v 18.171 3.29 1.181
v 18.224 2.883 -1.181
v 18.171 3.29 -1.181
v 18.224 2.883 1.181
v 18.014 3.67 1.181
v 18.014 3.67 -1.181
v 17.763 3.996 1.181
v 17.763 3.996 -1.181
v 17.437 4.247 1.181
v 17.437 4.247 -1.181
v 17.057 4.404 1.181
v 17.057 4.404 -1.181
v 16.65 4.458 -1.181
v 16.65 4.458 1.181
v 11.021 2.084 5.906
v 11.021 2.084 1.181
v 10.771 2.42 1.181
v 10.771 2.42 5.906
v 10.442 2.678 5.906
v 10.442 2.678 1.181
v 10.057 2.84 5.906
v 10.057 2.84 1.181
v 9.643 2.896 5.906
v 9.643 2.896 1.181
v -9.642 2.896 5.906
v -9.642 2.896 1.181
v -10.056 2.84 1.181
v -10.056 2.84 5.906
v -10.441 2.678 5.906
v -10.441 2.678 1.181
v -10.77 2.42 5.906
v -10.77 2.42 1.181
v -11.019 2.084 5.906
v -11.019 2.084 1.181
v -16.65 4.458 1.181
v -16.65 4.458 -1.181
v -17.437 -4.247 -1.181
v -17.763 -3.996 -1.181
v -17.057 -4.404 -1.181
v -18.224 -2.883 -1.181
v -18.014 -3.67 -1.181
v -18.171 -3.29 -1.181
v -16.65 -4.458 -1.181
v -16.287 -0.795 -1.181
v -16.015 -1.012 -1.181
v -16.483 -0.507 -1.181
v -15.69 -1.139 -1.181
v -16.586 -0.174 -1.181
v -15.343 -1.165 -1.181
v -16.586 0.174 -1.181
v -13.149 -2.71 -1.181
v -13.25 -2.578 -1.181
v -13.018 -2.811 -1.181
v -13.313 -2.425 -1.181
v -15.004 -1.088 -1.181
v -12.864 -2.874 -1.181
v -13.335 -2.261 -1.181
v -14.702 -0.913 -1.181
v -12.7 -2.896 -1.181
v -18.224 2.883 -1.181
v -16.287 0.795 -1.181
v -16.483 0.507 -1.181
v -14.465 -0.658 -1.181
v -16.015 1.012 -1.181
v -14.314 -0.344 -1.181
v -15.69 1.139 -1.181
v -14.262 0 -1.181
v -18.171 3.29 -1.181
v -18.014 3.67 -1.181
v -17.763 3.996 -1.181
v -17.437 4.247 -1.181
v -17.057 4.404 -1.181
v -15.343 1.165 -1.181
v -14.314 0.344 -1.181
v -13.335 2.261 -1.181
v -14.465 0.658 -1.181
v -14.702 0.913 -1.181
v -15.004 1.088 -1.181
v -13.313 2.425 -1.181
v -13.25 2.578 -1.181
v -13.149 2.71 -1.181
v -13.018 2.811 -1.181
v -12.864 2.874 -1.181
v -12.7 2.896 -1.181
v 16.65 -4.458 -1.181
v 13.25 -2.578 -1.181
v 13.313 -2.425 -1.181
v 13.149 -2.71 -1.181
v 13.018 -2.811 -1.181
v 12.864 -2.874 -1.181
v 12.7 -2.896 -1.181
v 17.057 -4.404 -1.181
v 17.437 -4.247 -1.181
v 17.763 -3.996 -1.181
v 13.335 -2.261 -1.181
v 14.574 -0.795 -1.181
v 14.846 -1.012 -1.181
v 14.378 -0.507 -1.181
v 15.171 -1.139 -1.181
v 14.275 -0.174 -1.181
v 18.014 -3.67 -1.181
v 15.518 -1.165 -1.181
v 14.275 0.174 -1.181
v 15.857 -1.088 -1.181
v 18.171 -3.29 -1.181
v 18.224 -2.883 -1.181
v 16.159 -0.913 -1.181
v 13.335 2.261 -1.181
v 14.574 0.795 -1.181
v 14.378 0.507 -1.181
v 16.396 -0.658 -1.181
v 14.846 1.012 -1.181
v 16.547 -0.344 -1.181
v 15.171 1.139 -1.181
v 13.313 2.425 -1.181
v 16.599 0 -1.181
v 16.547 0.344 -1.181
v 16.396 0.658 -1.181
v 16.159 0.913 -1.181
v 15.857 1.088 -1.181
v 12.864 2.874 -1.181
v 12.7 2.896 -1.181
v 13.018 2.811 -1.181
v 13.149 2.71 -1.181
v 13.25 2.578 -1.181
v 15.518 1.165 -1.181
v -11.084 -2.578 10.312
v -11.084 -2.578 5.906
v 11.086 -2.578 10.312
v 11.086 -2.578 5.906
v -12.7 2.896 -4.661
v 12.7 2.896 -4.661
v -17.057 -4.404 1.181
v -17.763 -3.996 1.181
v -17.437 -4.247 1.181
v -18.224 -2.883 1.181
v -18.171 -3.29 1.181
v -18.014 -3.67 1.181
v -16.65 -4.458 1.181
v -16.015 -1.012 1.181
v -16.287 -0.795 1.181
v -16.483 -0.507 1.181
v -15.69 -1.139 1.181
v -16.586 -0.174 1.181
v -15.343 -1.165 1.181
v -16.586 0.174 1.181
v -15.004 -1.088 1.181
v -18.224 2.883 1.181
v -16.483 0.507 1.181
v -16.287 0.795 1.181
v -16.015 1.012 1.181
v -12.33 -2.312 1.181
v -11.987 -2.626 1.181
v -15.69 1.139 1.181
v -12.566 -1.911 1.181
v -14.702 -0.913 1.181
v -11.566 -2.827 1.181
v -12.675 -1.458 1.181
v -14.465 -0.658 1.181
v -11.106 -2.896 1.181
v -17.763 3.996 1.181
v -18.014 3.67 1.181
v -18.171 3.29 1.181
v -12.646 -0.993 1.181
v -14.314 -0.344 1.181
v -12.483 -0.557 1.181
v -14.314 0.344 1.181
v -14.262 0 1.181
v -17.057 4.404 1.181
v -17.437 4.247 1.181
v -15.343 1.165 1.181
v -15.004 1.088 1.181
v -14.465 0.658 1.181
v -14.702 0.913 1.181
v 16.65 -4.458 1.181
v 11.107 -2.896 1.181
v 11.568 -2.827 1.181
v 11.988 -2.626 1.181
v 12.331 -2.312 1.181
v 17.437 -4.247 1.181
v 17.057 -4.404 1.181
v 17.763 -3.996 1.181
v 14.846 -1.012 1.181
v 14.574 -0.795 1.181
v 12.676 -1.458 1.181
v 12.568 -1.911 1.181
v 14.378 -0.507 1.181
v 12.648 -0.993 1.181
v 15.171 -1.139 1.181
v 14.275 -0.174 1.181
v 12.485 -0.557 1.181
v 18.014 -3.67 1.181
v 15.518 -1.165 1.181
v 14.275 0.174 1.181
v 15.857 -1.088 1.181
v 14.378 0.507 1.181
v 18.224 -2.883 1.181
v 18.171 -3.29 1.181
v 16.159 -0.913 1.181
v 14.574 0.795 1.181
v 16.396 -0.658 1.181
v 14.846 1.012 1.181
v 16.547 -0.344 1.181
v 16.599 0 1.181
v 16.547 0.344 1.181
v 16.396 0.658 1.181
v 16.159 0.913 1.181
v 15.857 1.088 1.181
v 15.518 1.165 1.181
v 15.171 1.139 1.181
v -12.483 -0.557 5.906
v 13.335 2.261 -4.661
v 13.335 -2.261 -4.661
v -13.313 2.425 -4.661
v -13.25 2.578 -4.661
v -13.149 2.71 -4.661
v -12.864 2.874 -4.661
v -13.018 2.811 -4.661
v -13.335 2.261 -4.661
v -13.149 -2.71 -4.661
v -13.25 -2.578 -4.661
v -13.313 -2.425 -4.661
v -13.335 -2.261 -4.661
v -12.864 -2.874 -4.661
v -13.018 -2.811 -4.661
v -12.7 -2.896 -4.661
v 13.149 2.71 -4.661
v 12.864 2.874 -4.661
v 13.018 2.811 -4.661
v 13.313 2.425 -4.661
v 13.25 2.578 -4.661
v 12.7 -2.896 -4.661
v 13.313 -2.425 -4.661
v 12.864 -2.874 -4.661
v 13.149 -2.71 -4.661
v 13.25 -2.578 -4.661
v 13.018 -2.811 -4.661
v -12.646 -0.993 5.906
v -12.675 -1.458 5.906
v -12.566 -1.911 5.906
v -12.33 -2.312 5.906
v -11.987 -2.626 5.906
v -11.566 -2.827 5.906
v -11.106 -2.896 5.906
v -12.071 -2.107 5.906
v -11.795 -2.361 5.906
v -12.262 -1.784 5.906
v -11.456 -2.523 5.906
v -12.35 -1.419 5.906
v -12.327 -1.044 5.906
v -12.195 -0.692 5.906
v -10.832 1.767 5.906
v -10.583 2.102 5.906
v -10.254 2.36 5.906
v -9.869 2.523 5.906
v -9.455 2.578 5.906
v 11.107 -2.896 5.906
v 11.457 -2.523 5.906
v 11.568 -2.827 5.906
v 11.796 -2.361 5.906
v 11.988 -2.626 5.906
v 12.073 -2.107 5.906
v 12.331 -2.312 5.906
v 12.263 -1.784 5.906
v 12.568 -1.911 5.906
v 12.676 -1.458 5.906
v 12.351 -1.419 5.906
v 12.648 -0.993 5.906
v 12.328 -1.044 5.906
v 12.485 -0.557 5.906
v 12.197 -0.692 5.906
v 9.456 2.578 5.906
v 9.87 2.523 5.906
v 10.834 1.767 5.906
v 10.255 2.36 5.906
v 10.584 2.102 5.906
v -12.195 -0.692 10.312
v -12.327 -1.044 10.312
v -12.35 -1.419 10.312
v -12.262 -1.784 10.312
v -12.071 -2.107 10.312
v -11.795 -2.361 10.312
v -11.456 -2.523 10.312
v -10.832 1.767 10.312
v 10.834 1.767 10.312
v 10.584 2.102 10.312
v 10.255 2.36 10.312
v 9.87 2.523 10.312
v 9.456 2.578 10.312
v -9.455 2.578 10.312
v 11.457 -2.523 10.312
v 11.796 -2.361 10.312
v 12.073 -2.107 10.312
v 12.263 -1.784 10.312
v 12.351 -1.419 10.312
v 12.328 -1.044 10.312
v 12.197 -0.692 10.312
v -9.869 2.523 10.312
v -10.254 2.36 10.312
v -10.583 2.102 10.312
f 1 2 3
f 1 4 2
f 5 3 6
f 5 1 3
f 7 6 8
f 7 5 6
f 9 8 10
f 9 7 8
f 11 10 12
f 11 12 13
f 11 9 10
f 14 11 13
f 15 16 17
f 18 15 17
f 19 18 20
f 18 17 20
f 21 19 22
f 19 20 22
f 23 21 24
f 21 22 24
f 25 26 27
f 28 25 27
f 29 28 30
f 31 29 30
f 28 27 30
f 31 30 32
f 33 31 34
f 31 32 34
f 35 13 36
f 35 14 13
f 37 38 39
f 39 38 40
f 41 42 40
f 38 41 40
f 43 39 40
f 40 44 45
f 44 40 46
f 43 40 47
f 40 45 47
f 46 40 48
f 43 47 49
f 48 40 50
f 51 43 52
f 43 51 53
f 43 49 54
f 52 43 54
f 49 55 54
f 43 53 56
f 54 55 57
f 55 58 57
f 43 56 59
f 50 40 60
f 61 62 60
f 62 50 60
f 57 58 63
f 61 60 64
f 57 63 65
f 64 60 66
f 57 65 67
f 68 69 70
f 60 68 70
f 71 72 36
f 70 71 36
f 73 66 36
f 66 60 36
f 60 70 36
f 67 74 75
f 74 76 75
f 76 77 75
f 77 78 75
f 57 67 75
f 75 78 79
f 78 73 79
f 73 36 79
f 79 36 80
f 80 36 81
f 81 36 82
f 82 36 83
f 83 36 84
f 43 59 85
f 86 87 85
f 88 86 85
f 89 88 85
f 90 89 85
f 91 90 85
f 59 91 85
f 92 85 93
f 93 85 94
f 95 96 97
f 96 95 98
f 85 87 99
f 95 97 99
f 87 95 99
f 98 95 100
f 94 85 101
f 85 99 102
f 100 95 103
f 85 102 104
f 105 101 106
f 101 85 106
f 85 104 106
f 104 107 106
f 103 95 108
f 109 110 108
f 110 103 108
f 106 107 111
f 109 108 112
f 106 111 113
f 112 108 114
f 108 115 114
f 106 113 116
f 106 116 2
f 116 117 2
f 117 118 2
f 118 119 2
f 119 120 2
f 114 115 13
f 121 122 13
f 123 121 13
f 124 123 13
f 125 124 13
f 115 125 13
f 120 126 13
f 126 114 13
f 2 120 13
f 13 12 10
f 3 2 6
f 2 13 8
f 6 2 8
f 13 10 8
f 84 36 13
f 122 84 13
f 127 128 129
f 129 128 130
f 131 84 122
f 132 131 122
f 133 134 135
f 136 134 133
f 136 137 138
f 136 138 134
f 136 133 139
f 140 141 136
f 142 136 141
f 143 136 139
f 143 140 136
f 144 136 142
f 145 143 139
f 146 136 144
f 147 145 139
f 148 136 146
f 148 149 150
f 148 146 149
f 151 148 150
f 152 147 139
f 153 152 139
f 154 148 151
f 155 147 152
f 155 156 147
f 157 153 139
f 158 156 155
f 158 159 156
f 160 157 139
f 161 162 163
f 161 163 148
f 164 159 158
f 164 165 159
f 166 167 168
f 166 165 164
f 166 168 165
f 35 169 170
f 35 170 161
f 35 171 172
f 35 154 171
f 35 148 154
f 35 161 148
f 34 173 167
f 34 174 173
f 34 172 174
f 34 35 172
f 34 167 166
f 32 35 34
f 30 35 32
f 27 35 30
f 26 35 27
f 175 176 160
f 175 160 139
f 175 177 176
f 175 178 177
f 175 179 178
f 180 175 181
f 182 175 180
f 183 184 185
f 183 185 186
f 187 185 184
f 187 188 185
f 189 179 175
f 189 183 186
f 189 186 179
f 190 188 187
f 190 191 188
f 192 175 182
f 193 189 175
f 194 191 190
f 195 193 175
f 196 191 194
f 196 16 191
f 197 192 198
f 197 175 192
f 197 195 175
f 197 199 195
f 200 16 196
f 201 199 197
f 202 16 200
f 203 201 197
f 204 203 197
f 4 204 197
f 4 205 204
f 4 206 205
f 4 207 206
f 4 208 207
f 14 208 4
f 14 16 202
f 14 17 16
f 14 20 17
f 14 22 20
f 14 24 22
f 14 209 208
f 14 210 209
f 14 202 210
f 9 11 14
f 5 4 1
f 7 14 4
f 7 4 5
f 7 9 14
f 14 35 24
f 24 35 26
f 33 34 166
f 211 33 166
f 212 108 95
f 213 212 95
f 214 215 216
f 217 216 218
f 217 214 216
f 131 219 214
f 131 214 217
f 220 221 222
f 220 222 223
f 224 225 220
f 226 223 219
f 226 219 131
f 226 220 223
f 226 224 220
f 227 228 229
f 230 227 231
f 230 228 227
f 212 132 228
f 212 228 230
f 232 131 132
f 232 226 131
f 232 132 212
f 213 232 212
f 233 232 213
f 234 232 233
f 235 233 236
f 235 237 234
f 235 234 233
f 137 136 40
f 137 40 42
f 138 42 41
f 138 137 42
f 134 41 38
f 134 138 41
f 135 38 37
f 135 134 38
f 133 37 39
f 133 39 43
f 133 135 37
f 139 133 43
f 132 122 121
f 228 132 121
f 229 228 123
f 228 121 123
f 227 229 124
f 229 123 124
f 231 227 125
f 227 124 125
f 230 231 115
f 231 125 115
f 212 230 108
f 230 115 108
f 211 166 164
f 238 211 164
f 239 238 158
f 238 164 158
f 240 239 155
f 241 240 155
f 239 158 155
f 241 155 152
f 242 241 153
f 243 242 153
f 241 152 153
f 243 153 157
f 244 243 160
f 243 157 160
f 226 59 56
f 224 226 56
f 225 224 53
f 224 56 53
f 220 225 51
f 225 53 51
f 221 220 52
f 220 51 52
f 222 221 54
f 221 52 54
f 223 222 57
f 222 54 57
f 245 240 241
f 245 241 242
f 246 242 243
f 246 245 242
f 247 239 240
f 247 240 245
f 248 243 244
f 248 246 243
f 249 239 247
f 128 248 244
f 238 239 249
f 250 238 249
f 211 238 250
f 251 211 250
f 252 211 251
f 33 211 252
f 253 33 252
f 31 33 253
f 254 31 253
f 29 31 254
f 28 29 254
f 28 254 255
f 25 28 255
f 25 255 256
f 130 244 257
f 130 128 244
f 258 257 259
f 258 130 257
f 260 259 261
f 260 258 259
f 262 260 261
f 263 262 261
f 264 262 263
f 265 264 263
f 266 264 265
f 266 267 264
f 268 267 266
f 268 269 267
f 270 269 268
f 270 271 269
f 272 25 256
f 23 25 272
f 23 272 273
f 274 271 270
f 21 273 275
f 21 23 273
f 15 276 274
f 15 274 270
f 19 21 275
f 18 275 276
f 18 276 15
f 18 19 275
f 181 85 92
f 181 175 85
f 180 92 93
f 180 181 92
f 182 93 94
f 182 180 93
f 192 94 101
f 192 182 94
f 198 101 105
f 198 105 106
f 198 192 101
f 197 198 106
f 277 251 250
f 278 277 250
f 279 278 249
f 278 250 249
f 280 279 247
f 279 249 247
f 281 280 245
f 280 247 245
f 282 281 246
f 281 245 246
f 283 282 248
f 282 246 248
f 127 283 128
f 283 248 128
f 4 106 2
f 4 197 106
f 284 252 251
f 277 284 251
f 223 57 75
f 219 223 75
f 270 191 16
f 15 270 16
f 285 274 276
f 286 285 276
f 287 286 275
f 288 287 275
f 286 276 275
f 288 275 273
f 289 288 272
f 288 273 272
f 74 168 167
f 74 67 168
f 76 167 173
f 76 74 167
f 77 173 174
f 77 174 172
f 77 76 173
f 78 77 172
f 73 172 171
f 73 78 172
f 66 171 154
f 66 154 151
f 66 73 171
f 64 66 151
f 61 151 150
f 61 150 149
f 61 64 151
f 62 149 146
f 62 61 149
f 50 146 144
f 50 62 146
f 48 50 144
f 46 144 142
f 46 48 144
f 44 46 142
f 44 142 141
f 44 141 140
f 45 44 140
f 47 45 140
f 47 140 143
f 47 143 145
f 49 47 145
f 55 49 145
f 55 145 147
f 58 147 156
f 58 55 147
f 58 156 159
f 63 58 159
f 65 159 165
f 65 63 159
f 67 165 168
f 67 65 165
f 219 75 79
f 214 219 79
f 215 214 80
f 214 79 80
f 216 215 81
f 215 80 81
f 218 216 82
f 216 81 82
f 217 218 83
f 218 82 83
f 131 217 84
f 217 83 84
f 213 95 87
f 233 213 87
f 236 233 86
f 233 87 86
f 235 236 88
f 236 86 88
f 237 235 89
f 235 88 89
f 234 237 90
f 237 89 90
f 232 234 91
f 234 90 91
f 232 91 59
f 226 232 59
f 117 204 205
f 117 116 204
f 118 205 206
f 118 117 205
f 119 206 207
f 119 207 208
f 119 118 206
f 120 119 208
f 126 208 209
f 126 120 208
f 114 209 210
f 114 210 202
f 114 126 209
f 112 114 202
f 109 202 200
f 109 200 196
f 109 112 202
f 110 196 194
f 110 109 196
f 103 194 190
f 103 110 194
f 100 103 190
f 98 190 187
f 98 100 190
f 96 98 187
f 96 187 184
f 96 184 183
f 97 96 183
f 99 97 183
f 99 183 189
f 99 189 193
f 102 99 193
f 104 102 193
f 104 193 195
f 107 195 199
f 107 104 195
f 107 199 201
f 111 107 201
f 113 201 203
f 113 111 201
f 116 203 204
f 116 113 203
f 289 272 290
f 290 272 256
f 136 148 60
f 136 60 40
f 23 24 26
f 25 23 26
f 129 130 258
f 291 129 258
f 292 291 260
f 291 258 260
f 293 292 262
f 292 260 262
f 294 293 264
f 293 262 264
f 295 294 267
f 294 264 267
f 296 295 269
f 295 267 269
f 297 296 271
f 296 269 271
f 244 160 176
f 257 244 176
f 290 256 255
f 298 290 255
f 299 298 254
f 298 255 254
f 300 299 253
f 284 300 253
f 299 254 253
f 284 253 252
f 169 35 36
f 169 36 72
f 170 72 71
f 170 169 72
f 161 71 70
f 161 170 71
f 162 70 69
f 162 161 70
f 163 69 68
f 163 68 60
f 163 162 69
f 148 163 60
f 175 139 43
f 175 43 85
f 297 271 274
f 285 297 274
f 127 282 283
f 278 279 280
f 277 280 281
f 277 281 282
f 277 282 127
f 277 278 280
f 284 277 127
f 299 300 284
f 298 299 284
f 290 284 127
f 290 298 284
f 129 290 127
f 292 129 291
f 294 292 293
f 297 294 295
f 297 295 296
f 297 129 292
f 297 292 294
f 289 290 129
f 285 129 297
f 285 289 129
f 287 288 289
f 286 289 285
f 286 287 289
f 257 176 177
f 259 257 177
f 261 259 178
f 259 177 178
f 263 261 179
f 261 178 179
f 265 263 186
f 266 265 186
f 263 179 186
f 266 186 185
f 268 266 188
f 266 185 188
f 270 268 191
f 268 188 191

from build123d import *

# Parameters (mm, degrees)
F0_R     = 1.1684
F1_DEPTH = 1.1811
F3_DEPTH = 4.7244
F5_DEPTH = 3.4798
F7_DEPTH = 4.4069


with BuildPart() as f1:
    # F0 (on Top) → F1 (new body, symmetric)
    with BuildSketch(Plane.XY):
        with BuildLine():
            Line((16.6497, 4.4577), (-16.6497, 4.4577))
            ThreePointArc((-16.6497, 4.4577), (-17.763252, 3.996452), (-18.2245, 2.8829))
            Line((-18.2245, 2.8829), (-18.2245, -2.8829))
            ThreePointArc((-18.2245, -2.8829), (-17.763252, -3.996452), (-16.6497, -4.4577))
            Line((-16.6497, -4.4577), (16.6497, -4.4577))
            ThreePointArc((16.6497, -4.4577), (17.763252, -3.996452), (18.2245, -2.8829))
            Line((18.2245, -2.8829), (18.2245, 2.8829))
            ThreePointArc((18.2245, 2.8829), (17.763252, 3.996452), (16.6497, 4.4577))
        make_face()
        with Locations((-15.4305, 0)):
            Circle(F0_R, mode=Mode.SUBTRACT)
        with Locations((15.4305, 0)):
            Circle(F0_R, mode=Mode.SUBTRACT)
    extrude(amount=F1_DEPTH, both=True)

    # F2 (on face) → F3 (join)
    with BuildSketch(Plane.XY.offset(1.1811)):
        with BuildLine():
            Line((-11.10602, -2.8956), (11.107478, -2.8956))
            ThreePointArc((11.107478, -2.8956), (12.464371, -2.120071), (12.484829, -0.557322))
            Line((12.484829, -0.557322), (11.020566, 2.084278))
            ThreePointArc((11.020566, 2.084278), (10.442486, 2.677694), (9.643215, 2.8956))
            Line((9.643215, 2.8956), (-9.641757, 2.8956))
            ThreePointArc((-9.641757, 2.8956), (-10.441029, 2.677694), (-11.019108, 2.084278))
            Line((-11.019108, 2.084278), (-12.483371, -0.557322))
            ThreePointArc((-12.483371, -0.557322), (-12.462914, -2.120071), (-11.10602, -2.8956))
        make_face()
    extrude(amount=F3_DEPTH)

    # F4 (on face) → F5 (join)
    with BuildSketch(Plane(origin=(0, 0, -1.1811), x_dir=(1, 0, 0), z_dir=(0, 0, -1))):
        with BuildLine():
            Line((12.7, 2.8956), (-12.7, 2.8956))
            ThreePointArc((-12.7, 2.8956), (-13.149013, 2.709613), (-13.335, 2.2606))
            Line((-13.335, 2.2606), (-13.335, -2.2606))
            ThreePointArc((-13.335, -2.2606), (-13.149013, -2.709613), (-12.7, -2.8956))
            Line((-12.7, -2.8956), (12.7, -2.8956))
            ThreePointArc((12.7, -2.8956), (13.149013, -2.709613), (13.335, -2.2606))
            Line((13.335, -2.2606), (13.335, 2.2606))
            ThreePointArc((13.335, 2.2606), (13.149013, 2.709613), (12.7, 2.8956))
        make_face()
    extrude(amount=F5_DEPTH)

    # F6 (on face) → F7 (join)
    with BuildSketch(Plane.XY.offset(5.9055)):
        with BuildLine():
            Line((9.456193, 2.5781), (-9.454736, 2.5781))
            ThreePointArc((-9.454736, 2.5781), (-10.254007, 2.360194), (-10.832087, 1.766778))
            Line((-10.832087, 1.766778), (-12.195227, -0.692392))
            ThreePointArc((-12.195227, -0.692392), (-12.178729, -1.952674), (-11.08446, -2.5781))
            Line((-11.08446, -2.5781), (11.085917, -2.5781))
            ThreePointArc((11.085917, -2.5781), (12.180186, -1.952674), (12.196684, -0.692392))
            Line((12.196684, -0.692392), (10.833544, 1.766778))
            ThreePointArc((10.833544, 1.766778), (10.255464, 2.360194), (9.456193, 2.5781))
        make_face()
    extrude(amount=F7_DEPTH)


solid = f1.part
